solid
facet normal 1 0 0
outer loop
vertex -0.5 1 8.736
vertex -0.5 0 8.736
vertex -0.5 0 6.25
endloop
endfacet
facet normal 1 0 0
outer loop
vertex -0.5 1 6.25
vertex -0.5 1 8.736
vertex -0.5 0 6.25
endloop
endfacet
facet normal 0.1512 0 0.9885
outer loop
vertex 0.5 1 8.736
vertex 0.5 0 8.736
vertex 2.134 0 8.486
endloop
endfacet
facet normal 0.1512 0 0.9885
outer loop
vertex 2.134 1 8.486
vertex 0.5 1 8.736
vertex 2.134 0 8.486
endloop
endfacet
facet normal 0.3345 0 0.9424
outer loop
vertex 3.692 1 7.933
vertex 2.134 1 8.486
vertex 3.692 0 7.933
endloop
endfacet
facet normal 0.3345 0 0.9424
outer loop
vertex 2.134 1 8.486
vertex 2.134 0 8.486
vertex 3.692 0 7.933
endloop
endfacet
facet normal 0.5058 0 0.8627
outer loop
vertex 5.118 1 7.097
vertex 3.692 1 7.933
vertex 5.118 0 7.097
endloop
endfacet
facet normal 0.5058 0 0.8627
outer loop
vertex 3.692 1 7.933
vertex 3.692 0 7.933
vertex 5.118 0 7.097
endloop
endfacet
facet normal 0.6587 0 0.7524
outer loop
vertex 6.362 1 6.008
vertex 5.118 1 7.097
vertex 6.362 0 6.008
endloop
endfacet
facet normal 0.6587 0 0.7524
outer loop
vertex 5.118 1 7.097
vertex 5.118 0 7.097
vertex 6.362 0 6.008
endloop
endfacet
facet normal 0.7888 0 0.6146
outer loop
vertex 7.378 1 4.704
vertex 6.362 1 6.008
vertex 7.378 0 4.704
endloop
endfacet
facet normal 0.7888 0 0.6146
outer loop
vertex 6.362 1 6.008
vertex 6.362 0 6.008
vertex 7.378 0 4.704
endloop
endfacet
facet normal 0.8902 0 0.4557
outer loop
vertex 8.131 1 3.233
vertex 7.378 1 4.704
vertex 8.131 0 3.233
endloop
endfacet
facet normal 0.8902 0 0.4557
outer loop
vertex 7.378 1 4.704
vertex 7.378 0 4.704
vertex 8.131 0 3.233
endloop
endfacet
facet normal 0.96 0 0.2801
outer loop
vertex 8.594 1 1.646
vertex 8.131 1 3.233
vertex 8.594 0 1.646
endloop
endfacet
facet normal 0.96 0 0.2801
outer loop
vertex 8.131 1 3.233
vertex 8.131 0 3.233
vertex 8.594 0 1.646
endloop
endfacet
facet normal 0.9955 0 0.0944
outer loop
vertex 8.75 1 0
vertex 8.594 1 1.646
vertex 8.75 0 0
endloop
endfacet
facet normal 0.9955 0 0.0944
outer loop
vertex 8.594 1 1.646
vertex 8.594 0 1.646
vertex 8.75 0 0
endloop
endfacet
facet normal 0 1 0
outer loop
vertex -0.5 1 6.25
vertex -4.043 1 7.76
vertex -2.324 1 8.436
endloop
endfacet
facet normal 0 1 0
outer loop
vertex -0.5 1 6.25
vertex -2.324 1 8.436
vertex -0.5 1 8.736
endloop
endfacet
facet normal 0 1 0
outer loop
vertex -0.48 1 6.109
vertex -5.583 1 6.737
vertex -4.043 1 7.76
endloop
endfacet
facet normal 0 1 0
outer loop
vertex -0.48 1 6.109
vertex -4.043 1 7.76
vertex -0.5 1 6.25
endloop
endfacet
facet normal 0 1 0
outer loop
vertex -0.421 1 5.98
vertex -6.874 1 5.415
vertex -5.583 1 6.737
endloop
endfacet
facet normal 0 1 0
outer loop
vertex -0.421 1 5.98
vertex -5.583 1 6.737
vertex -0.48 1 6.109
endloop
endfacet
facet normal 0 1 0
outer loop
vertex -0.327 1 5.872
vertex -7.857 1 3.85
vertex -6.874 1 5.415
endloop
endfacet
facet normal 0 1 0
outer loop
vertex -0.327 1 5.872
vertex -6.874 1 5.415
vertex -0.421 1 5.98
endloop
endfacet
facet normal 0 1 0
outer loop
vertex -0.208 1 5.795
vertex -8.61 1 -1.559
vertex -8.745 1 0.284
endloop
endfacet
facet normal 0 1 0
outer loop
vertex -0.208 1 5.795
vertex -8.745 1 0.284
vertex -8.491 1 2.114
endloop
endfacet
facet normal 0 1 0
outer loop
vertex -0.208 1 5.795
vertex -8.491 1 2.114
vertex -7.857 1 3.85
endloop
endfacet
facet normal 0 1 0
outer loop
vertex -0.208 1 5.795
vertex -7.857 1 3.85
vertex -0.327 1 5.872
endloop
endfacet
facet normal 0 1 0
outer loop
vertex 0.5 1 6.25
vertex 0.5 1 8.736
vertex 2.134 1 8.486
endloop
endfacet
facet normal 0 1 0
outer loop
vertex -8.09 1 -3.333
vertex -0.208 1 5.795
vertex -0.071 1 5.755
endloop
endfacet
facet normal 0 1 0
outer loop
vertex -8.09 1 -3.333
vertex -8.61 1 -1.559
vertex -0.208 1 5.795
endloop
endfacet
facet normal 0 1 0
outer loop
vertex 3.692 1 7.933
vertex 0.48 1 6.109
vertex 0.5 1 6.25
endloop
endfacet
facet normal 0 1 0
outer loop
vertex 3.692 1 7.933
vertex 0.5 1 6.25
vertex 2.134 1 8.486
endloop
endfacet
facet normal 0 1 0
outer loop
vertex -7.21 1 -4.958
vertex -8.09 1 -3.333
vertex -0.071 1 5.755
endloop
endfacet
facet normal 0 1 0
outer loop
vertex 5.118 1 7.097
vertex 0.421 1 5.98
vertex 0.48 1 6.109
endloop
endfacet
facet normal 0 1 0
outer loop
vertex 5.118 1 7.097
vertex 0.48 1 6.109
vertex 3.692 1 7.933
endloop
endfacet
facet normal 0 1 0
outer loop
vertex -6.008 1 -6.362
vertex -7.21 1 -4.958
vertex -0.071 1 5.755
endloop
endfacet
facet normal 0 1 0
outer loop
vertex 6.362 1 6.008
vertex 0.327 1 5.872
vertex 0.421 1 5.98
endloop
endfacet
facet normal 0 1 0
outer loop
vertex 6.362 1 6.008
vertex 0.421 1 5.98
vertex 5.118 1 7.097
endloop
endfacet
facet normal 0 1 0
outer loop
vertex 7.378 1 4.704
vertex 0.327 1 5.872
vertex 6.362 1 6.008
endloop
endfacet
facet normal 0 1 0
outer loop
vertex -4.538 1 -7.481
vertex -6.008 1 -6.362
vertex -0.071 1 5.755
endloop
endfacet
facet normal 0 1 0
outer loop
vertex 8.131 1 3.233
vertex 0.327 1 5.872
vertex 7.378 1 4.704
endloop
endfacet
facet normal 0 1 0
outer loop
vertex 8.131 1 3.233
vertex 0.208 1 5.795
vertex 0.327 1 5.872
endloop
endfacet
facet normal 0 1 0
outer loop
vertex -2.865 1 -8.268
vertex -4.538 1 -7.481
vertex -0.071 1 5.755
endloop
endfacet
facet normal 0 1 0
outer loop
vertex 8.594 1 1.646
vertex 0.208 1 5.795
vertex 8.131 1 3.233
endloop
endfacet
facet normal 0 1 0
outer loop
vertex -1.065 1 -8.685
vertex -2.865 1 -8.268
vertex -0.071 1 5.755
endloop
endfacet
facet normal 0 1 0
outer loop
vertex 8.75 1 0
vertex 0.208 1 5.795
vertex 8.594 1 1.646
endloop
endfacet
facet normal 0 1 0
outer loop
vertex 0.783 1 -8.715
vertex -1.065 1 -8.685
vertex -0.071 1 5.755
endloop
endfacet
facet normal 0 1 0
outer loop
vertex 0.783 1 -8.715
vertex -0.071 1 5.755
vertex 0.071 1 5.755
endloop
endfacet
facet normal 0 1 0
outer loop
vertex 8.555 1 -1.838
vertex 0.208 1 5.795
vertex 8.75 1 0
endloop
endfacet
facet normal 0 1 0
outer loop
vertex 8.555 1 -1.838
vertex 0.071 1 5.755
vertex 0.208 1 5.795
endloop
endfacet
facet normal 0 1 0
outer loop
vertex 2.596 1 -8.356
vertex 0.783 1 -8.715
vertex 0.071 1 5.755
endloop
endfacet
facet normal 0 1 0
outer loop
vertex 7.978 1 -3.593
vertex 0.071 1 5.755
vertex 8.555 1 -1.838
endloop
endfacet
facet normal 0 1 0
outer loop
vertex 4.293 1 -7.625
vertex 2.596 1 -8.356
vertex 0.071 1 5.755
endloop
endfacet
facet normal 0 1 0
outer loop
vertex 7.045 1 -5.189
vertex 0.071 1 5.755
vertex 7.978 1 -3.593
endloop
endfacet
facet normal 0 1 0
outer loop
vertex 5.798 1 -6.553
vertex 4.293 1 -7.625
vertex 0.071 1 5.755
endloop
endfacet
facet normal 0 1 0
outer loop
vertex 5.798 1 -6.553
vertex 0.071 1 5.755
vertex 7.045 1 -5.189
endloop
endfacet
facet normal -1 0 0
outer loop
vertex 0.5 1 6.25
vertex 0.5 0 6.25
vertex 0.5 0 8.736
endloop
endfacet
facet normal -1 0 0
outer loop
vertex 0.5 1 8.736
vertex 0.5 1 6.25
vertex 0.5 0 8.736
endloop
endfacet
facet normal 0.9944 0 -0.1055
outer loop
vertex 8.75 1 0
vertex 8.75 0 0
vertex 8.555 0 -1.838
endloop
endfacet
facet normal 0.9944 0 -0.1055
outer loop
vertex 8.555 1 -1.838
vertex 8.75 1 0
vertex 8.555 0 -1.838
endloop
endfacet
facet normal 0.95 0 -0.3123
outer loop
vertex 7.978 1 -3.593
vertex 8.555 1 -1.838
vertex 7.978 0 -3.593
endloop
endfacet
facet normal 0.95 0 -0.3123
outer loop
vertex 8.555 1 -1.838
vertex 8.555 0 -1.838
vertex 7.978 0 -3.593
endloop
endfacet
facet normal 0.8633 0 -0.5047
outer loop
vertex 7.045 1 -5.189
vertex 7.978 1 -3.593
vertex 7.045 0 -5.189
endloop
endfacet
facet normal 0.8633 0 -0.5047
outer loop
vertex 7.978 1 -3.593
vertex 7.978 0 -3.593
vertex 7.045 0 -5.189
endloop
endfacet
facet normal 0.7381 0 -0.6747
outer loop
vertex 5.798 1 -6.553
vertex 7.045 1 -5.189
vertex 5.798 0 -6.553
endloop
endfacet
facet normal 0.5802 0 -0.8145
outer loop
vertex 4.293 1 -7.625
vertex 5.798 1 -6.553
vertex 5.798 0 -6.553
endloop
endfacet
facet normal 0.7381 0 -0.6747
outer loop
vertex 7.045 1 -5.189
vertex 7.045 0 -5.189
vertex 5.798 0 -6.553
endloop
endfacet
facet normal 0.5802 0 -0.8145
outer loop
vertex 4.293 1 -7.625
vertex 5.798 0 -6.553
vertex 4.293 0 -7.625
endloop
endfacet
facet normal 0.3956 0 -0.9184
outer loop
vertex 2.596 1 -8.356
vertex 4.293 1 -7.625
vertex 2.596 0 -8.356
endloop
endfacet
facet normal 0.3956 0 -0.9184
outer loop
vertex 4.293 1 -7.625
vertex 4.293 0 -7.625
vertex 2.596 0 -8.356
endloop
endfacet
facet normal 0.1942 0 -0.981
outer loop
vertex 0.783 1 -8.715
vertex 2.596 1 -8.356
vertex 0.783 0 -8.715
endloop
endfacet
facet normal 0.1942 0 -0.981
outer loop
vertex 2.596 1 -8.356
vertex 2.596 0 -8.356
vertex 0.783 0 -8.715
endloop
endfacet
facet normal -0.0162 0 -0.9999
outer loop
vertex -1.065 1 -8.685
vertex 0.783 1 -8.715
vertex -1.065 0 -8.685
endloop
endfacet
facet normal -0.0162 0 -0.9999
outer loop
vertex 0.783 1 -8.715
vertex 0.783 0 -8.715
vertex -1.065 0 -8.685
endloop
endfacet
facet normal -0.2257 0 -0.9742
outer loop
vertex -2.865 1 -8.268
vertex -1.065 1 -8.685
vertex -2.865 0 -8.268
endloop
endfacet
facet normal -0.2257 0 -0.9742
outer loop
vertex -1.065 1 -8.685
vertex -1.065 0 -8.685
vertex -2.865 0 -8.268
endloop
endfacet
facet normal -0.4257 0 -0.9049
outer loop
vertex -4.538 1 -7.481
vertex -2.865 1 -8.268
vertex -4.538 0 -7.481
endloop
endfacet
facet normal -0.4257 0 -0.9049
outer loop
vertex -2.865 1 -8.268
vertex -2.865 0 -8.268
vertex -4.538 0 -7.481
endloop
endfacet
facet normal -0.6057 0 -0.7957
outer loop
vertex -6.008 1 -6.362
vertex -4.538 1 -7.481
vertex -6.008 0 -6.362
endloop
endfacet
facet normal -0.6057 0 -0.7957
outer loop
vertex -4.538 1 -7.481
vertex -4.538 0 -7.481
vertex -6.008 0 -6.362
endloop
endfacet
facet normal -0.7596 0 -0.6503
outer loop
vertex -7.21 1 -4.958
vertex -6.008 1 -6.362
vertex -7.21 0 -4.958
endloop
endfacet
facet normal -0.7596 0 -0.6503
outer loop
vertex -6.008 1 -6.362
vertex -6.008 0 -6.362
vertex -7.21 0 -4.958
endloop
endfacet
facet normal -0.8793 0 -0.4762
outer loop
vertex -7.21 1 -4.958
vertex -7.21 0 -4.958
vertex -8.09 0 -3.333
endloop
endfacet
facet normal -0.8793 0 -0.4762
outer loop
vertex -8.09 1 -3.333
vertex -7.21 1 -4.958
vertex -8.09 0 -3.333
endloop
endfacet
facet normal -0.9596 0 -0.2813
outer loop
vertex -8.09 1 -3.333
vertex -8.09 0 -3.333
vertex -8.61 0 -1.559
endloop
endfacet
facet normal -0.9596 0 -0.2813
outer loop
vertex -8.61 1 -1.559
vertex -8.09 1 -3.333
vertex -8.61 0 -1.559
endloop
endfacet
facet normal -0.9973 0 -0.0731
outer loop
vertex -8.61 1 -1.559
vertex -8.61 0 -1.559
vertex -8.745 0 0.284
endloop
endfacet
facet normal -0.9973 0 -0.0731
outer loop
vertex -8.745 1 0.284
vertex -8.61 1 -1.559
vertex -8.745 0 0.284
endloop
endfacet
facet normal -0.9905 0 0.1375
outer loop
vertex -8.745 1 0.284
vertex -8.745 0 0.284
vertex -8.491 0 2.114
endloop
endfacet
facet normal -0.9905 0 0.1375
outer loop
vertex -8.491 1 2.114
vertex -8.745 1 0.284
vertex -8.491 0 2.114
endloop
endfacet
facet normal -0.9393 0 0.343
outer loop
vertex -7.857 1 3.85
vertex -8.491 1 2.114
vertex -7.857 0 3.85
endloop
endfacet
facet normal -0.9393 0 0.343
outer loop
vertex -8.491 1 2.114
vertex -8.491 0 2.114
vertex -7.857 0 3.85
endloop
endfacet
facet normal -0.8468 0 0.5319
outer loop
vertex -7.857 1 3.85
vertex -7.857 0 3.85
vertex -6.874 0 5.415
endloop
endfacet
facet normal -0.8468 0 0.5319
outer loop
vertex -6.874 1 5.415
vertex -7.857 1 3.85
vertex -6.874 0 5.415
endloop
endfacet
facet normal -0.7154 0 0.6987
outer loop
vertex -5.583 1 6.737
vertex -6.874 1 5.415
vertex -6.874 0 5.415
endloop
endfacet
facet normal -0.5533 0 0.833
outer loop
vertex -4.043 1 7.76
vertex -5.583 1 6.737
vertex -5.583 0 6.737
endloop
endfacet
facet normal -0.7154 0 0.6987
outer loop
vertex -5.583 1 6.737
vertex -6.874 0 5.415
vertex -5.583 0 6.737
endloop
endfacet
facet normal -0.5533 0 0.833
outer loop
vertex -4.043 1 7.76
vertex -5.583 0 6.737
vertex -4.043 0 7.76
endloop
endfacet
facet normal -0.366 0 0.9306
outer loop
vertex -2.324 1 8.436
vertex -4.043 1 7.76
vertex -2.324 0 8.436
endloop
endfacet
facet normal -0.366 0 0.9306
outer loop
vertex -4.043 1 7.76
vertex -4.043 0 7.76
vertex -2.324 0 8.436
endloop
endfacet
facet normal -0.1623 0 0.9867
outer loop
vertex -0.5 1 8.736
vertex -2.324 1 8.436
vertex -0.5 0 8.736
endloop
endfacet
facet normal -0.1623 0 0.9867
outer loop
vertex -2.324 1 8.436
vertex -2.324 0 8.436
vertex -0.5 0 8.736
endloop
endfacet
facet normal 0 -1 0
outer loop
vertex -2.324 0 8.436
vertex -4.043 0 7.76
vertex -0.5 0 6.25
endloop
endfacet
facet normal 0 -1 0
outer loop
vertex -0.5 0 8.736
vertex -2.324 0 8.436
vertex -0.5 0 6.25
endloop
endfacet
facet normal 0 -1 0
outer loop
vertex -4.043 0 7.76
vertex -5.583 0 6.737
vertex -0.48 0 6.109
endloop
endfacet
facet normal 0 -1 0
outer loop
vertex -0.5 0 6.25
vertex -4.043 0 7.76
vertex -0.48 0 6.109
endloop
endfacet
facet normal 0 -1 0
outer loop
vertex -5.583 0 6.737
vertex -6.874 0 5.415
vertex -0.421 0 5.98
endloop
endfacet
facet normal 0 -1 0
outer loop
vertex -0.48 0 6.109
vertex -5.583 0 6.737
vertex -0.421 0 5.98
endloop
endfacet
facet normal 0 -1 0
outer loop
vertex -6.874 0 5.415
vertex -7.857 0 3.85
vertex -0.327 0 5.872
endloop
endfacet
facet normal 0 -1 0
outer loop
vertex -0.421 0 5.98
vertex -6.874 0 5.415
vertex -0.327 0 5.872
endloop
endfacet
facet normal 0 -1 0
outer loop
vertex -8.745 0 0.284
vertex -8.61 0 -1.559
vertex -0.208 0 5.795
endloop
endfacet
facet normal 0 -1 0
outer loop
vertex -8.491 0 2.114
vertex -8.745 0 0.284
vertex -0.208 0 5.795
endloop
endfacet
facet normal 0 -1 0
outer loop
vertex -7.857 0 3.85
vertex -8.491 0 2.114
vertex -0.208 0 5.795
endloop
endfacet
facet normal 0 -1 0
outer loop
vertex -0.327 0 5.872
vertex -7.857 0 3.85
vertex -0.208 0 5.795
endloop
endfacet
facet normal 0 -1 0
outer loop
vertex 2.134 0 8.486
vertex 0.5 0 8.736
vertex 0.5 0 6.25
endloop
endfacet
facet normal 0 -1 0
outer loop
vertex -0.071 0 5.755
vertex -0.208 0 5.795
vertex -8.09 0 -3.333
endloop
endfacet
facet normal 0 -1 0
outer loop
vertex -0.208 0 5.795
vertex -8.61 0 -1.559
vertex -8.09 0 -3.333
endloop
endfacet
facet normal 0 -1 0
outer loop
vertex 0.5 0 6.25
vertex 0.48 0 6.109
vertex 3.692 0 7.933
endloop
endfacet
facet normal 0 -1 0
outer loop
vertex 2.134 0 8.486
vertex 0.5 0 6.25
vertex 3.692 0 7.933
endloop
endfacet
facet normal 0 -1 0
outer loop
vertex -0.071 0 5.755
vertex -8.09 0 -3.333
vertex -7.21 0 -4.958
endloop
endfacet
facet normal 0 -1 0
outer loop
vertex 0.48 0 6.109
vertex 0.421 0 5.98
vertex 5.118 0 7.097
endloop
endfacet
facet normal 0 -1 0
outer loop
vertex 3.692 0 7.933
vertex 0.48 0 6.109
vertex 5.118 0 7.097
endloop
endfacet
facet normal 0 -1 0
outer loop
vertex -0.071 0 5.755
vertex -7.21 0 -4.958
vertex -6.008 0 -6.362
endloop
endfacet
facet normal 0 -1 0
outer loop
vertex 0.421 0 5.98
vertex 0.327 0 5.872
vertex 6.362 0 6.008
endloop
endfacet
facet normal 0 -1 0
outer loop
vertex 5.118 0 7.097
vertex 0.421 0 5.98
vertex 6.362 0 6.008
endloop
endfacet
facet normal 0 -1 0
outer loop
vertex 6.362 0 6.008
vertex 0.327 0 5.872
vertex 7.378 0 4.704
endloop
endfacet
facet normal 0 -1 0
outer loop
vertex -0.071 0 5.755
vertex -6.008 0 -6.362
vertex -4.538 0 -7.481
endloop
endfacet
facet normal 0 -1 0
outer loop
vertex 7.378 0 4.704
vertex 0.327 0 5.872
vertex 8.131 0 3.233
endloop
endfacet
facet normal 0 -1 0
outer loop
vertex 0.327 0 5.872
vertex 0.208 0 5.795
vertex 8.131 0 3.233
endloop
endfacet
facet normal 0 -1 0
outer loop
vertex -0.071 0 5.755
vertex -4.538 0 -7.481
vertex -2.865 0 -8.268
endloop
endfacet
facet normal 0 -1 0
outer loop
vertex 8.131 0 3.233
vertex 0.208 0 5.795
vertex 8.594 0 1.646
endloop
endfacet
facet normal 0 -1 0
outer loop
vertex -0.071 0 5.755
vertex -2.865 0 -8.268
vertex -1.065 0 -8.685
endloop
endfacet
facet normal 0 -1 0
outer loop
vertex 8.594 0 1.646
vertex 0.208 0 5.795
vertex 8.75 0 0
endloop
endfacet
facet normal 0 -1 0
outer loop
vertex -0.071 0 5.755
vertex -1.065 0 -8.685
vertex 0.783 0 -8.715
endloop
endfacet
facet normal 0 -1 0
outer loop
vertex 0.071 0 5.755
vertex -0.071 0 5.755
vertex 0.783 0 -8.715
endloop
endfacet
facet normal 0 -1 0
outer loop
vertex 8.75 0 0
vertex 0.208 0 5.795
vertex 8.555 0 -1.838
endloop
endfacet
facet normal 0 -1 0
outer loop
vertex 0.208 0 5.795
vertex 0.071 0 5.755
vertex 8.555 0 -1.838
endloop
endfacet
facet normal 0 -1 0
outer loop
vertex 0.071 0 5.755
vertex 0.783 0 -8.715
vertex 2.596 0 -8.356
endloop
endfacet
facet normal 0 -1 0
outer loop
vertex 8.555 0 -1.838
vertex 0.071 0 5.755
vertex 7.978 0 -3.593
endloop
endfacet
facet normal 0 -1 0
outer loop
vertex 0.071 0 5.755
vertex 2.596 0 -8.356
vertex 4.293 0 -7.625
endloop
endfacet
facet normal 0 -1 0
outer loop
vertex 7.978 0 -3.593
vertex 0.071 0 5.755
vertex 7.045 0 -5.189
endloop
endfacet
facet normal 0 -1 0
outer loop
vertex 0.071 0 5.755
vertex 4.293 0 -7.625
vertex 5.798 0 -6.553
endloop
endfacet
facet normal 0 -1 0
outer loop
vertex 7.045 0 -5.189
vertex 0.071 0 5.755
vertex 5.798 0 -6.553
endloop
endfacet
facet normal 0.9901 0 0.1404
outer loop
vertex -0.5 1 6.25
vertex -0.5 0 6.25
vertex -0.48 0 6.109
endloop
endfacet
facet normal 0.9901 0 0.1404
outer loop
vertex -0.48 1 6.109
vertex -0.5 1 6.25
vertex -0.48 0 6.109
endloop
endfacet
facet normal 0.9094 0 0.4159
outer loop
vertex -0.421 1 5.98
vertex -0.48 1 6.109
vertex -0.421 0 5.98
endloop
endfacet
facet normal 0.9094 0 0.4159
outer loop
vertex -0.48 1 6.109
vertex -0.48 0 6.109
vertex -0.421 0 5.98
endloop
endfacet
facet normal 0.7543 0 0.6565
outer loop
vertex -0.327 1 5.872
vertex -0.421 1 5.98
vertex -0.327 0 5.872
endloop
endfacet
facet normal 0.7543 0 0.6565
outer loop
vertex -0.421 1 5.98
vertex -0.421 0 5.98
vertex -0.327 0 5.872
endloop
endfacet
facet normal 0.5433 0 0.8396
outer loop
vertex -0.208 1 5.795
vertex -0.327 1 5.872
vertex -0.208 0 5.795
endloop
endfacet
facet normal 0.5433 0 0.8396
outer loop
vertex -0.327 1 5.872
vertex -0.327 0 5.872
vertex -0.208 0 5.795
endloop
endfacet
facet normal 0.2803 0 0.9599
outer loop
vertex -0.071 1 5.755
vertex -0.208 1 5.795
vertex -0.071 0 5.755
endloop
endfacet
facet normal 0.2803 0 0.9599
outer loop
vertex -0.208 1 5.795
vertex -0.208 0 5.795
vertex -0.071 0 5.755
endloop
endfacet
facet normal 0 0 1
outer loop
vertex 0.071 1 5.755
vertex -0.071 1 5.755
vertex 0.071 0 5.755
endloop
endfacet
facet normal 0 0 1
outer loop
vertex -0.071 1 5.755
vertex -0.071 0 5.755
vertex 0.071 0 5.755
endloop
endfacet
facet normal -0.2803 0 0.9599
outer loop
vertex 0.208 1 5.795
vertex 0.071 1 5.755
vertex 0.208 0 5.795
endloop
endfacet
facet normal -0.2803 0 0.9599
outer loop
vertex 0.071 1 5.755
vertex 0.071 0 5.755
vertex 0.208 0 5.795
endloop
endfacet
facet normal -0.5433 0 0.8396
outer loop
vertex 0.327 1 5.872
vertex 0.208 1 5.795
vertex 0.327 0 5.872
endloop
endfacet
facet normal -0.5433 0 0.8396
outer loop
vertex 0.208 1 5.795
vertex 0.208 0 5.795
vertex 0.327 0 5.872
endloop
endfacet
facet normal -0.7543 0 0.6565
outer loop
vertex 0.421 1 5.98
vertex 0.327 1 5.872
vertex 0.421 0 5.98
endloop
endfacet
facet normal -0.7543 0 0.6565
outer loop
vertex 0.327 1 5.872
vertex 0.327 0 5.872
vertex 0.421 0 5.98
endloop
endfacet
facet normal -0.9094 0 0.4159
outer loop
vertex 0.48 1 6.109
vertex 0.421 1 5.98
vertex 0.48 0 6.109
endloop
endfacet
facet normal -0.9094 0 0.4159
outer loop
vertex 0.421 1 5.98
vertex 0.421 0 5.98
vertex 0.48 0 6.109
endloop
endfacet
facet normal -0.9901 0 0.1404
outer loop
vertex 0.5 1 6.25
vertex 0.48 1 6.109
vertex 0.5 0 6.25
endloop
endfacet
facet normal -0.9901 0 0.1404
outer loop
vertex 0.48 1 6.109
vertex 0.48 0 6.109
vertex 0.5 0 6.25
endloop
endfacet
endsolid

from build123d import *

# Parameters (mm, degrees)
BOSS_EXTRUDE1_DEPTH = 1


with BuildPart() as part:
    # Sketch1 → Boss-Extrude1 (new body)
    with BuildSketch(Plane(origin=(0, 0, 0), x_dir=(1, 0, 0), z_dir=(0, 1, 0))):
        with BuildLine():
            ThreePointArc((8.75, 0), (-6.00780742, 6.361505325), (-0.5, -8.735702605))
            Line((-0.5, -8.735702605), (-0.5, -6.25))
            ThreePointArc((-0.5, -6.25), (0, -5.75), (0.5, -6.25))
            Line((0.5, -6.25), (0.5, -8.735702605))
            ThreePointArc((0.5, -8.735702605), (6.361505325, -6.00780742), (8.75, 0))
        make_face()
    extrude(amount=BOSS_EXTRUDE1_DEPTH)


solid = part.part
